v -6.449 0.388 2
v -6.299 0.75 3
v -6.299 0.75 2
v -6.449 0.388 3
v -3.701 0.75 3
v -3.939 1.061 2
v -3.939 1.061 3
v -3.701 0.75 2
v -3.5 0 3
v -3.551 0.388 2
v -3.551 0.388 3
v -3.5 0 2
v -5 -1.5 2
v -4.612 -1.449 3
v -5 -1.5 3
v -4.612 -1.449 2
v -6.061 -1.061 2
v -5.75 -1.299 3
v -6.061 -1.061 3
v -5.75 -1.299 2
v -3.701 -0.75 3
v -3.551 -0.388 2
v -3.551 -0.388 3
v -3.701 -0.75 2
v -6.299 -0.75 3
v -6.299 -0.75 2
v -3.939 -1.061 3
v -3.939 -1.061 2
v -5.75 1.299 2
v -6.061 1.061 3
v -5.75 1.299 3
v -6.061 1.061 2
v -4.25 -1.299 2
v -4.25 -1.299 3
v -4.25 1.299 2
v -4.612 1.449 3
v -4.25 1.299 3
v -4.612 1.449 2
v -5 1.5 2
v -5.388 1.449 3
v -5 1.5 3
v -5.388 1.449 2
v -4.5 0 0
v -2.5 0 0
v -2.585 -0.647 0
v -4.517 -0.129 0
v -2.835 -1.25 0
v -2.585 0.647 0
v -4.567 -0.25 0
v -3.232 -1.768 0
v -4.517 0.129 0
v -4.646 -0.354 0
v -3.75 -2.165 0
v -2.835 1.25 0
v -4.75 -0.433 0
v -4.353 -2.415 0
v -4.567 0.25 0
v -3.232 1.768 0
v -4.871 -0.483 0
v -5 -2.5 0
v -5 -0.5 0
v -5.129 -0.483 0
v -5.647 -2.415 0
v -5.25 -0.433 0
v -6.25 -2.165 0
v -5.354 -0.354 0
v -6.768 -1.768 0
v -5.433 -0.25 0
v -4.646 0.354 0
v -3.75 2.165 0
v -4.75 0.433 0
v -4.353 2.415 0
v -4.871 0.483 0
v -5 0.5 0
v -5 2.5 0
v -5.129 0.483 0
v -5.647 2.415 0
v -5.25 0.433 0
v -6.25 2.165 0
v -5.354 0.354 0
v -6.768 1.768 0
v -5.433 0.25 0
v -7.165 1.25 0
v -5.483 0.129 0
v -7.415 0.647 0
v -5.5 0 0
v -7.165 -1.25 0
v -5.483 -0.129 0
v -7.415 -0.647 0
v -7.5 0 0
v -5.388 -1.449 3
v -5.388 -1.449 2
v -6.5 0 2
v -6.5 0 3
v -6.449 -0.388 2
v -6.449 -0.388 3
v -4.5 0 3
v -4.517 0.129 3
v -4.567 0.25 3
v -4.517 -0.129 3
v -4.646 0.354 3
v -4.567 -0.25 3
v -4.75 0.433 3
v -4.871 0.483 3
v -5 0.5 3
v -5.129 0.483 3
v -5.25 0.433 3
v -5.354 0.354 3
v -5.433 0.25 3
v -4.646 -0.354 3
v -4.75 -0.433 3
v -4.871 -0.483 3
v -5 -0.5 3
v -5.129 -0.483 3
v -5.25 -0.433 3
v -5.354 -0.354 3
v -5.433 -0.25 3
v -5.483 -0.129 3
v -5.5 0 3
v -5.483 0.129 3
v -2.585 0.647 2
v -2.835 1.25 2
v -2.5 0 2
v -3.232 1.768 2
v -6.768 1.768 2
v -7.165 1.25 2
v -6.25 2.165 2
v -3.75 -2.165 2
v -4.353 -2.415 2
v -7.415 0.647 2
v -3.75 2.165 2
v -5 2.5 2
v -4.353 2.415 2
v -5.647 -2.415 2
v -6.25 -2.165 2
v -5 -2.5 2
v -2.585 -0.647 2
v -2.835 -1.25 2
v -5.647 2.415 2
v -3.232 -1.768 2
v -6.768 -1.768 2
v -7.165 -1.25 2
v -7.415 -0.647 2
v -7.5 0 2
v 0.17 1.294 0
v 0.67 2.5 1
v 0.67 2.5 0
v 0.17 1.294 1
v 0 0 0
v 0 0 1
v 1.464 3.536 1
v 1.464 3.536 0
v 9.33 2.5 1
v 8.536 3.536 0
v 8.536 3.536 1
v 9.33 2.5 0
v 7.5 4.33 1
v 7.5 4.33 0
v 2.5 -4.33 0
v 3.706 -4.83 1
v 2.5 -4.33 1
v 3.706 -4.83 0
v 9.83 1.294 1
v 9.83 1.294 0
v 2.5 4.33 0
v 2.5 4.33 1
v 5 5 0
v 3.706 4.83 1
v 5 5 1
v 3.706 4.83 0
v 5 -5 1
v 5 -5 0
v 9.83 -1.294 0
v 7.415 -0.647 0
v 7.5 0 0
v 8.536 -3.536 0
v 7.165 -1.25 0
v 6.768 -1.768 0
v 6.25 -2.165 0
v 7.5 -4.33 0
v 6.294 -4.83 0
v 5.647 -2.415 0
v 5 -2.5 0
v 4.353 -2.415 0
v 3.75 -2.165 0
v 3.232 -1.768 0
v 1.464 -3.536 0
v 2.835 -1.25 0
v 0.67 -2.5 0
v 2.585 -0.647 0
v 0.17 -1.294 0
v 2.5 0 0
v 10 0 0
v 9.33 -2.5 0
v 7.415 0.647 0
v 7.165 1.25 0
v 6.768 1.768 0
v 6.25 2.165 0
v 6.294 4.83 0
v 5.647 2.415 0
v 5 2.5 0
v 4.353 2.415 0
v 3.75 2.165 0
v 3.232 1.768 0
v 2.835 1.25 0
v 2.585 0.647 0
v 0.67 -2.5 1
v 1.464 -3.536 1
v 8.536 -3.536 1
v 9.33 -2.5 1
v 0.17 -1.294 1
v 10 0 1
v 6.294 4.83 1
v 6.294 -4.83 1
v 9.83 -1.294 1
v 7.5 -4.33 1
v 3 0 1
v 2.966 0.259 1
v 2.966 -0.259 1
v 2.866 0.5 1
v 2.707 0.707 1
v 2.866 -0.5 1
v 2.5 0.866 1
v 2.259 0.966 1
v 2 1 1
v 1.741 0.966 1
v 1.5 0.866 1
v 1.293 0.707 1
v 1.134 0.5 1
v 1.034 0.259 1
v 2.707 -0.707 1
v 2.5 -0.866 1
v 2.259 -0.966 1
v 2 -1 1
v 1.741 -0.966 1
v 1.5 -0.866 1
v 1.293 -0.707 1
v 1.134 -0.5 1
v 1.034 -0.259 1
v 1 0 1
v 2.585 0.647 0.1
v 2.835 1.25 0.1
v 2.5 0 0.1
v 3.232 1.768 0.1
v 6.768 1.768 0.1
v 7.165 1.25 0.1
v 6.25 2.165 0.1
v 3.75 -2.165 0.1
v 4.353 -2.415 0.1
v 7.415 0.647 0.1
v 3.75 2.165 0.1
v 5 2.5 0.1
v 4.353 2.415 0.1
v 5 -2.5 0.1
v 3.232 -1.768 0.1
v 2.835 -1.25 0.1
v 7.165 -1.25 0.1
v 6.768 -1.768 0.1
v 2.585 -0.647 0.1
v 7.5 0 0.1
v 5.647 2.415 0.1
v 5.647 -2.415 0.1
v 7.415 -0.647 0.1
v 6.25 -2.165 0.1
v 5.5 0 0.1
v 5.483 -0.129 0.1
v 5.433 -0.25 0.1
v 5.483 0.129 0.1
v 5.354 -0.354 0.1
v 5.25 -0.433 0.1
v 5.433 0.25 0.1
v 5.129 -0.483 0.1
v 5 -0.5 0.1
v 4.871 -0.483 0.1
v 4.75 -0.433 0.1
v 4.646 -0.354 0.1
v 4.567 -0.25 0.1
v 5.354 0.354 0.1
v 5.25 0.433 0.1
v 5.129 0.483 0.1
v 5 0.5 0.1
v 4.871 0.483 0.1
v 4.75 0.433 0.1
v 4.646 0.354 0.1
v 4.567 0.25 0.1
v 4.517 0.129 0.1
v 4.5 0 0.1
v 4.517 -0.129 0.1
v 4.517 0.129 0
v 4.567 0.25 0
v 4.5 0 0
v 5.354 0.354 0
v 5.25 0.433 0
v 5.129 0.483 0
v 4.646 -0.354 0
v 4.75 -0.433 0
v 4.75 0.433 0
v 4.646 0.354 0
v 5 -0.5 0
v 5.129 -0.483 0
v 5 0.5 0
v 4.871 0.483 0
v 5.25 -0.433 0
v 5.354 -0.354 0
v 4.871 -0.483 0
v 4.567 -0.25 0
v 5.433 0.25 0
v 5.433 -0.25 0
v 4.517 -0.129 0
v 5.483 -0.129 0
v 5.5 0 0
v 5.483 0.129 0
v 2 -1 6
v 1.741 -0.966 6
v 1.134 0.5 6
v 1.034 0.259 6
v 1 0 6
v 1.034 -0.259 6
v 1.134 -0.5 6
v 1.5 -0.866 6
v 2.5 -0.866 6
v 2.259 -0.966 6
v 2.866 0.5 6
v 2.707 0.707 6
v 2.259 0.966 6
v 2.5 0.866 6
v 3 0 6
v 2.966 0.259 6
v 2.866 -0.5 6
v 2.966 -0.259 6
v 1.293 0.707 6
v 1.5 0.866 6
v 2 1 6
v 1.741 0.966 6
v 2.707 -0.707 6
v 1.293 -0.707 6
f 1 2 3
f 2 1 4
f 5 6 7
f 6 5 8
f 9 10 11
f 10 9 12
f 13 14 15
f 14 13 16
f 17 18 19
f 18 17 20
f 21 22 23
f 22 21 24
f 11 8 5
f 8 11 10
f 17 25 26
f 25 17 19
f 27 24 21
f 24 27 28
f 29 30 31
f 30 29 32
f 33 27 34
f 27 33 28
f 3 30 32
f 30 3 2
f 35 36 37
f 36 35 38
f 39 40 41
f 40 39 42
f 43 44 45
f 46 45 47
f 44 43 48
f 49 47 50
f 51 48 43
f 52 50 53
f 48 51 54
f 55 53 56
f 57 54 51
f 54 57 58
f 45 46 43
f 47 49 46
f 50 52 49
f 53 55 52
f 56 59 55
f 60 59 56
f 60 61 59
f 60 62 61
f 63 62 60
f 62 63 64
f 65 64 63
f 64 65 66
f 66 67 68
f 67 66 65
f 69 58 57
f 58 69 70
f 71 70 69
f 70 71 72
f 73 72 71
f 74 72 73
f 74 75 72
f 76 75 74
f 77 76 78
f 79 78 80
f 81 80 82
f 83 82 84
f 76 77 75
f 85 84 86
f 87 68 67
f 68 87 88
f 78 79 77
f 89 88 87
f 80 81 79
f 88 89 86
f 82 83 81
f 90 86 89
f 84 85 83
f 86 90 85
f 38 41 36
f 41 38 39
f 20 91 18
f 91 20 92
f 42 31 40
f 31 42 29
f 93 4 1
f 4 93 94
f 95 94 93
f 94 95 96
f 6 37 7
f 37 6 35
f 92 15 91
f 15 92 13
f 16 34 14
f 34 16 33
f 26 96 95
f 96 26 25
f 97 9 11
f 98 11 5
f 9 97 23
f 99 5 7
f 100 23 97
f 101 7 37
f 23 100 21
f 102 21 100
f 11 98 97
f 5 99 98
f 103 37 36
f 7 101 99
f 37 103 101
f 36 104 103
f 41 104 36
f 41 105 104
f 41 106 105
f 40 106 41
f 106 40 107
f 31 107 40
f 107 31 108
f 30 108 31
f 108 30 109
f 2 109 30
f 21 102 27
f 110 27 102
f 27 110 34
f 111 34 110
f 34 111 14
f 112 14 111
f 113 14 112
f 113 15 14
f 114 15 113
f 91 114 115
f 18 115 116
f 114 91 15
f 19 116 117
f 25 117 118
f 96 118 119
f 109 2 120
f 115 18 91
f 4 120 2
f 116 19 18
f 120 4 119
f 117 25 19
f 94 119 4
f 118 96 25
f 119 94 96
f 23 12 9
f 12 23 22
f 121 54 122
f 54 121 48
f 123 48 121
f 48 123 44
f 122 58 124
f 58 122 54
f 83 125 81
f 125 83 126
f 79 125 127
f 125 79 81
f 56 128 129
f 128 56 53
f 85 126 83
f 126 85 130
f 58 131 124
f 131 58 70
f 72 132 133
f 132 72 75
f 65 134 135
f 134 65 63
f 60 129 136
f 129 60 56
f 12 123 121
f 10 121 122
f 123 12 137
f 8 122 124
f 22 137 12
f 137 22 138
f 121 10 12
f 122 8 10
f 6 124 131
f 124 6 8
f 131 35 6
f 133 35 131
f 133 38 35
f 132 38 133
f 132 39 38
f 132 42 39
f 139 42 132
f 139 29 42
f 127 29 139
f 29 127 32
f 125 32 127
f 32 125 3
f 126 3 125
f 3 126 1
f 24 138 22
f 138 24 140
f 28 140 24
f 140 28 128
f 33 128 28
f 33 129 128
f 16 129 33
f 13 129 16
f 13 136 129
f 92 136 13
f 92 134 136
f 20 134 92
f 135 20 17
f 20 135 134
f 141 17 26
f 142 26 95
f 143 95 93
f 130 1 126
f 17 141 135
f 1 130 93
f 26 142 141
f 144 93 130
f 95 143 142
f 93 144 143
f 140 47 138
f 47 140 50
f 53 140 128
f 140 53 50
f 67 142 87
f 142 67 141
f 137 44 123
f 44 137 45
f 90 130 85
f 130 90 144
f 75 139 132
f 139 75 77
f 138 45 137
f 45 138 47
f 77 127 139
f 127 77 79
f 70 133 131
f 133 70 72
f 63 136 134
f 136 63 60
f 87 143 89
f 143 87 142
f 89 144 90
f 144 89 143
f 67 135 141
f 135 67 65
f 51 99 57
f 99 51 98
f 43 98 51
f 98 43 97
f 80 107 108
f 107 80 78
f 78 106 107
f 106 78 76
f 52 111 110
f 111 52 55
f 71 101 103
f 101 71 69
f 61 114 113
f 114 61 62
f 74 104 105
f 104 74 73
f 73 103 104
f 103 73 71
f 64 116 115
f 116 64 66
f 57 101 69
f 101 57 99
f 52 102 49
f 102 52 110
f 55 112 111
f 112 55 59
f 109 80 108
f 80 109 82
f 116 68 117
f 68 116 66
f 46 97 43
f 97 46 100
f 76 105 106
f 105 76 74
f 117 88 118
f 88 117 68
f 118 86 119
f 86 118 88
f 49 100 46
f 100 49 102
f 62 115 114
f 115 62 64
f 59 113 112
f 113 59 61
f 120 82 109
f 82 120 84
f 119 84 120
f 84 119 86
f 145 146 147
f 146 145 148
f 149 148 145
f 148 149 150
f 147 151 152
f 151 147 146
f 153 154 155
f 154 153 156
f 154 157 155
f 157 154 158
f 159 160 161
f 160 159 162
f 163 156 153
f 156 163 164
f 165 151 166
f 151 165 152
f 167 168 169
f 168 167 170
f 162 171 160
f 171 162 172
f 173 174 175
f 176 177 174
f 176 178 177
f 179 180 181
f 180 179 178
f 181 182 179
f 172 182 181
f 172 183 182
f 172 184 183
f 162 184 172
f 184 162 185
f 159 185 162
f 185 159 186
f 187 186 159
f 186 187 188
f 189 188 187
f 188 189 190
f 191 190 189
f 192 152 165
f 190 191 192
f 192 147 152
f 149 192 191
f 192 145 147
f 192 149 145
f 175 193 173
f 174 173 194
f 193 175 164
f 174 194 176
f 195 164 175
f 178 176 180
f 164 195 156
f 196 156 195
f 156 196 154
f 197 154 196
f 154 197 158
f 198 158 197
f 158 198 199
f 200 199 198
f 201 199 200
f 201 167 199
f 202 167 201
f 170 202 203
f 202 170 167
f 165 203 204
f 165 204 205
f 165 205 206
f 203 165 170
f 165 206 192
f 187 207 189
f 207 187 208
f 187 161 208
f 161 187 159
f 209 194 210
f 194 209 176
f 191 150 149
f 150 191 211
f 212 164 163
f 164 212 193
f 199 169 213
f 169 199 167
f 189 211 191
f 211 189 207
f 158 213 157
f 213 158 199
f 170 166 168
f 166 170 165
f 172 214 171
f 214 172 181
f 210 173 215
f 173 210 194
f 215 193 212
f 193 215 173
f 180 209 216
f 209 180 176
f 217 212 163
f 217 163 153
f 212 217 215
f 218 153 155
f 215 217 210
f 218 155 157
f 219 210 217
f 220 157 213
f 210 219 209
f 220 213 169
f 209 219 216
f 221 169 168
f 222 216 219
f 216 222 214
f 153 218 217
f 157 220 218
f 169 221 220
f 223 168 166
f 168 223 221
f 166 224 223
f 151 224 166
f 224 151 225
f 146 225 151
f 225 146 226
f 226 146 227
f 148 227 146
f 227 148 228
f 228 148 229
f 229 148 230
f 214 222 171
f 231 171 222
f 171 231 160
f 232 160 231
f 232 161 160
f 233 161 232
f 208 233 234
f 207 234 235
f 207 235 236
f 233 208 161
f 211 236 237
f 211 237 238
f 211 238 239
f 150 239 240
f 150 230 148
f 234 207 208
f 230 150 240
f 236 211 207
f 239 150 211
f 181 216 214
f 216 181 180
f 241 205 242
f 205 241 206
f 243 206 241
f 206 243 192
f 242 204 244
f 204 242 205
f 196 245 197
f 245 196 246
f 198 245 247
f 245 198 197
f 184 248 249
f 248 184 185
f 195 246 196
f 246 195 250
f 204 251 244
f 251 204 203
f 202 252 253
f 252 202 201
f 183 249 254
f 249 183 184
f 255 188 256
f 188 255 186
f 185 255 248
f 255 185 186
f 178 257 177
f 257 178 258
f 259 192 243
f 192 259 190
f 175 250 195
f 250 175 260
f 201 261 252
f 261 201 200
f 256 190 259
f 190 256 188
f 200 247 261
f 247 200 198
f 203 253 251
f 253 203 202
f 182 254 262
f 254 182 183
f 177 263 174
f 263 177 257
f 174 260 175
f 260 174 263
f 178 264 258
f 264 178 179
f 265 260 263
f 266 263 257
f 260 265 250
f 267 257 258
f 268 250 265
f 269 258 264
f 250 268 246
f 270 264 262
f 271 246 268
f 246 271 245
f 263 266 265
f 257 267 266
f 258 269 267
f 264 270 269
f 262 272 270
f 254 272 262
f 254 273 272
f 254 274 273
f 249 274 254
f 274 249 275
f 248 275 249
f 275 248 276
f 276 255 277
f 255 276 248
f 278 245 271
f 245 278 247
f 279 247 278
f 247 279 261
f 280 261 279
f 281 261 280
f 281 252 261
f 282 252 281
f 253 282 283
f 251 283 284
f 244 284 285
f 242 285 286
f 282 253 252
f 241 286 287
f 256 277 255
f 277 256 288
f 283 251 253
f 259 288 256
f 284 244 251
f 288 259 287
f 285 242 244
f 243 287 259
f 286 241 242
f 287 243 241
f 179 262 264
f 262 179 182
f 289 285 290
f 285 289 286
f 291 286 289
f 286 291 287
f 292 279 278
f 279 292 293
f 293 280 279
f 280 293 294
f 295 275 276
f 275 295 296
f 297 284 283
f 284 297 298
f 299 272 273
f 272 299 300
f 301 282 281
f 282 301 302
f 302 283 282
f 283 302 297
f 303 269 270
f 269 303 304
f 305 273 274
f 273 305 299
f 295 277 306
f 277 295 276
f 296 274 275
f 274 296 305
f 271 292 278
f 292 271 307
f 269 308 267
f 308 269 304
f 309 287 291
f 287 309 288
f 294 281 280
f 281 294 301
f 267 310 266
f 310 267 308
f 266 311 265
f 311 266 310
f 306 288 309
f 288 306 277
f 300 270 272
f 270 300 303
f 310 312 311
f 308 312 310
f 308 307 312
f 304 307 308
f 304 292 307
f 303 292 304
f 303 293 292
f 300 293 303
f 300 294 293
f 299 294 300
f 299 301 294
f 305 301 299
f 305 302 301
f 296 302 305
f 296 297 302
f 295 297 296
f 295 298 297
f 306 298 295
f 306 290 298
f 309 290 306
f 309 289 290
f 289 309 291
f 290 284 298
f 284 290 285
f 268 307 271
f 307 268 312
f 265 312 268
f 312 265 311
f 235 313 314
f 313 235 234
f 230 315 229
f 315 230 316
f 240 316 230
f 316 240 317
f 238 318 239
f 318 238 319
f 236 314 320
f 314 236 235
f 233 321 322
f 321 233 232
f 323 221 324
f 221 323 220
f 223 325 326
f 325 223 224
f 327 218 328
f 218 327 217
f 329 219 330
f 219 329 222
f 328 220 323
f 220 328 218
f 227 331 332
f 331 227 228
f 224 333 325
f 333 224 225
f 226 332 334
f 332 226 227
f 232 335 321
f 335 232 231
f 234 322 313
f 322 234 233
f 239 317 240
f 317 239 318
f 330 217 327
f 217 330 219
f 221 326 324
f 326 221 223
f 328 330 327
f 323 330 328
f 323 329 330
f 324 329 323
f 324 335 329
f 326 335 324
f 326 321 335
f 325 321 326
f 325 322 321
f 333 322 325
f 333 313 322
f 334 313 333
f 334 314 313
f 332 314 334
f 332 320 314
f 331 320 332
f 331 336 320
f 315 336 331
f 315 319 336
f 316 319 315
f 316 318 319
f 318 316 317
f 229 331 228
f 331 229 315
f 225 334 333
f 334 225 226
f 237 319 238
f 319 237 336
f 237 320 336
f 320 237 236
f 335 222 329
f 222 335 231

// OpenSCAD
$fn=24;
translate([-5,0,0])
difference(){
	union(){
		cylinder(d1 = 3, d2 = 3, h = 3);
		cylinder(d1 = 5, d2 = 5, h = 2);
	}
	cylinder(d1=1, d2=1, h=3);
}

translate([5,0,1])
rotate([0,180,0])
union(){
	difference(){
		cylinder(d1 = 10, d2 = 10, h = 1);
		// just for seeing where to glue the 2 parts together
		translate([0, 0, .9]) cylinder(d1 = 5, d2 = 5, h = .1);
	}
	translate([0, 0, .9]) cylinder(d1 = 1, d2 = 1, h = .1);
	translate([3, 0, -5]) cylinder(d1 = 2, d2 = 2, h = 5);
	
}
